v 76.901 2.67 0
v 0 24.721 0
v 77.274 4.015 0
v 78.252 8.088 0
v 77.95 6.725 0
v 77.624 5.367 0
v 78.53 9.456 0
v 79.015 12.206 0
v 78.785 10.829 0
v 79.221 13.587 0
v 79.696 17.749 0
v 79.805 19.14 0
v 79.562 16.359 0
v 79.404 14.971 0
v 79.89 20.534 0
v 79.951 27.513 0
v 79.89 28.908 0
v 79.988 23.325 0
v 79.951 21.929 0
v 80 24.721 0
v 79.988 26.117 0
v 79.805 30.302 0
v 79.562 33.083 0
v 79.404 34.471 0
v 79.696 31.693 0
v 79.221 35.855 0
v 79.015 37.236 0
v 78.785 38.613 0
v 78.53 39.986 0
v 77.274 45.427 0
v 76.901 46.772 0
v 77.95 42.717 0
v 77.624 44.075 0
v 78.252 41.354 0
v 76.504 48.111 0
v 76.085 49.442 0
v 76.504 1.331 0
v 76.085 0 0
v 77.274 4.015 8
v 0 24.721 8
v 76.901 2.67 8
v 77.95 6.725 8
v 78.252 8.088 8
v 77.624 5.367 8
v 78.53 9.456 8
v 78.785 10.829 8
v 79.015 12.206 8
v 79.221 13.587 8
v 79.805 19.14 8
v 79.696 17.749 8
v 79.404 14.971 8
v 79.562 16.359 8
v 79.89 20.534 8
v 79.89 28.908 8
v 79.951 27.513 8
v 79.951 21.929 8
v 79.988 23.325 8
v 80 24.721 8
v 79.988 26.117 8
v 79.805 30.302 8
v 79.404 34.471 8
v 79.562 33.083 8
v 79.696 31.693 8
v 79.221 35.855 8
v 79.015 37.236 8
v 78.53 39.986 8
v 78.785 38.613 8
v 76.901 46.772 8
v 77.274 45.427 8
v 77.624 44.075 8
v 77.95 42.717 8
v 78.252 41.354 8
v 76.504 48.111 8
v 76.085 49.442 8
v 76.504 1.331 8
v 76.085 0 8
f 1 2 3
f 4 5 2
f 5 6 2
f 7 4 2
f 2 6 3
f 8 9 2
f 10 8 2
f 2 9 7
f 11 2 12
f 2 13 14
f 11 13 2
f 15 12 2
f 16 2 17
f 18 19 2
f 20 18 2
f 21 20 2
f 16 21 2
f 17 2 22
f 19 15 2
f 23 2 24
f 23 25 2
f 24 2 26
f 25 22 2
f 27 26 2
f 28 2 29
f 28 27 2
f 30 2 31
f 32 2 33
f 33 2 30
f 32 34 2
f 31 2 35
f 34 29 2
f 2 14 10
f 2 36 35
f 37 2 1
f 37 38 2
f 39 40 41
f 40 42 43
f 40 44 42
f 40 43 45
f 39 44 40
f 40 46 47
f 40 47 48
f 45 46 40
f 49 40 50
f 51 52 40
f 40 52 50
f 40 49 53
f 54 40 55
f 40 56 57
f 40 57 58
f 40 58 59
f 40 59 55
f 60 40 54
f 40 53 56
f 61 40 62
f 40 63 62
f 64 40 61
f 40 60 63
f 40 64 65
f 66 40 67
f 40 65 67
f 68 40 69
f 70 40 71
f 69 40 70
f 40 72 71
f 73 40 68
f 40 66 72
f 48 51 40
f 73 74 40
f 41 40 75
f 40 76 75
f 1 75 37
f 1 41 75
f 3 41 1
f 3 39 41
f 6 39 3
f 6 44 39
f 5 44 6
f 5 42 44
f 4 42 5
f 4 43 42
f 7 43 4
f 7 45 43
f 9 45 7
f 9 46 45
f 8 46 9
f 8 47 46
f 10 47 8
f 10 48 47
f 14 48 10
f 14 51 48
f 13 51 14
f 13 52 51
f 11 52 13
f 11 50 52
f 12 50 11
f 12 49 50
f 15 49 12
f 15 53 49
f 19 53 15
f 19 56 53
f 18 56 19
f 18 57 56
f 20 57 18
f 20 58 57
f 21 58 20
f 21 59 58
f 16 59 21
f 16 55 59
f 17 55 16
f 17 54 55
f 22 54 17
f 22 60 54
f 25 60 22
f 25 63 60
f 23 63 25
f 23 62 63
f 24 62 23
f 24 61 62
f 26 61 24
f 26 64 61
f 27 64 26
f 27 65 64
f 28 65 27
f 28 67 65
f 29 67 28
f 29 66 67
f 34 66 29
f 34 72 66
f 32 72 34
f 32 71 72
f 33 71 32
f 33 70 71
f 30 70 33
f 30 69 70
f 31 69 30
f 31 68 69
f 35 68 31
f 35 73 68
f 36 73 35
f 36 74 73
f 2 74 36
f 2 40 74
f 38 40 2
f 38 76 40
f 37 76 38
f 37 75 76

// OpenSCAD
$fn = 32;

// ----------------------------------------------------------------------
// Arc profile plate: sector, 38 points
// ----------------------------------------------------------------------

// --- parameters (mm) ---
sector_angle = 36;        // sector angle, degrees
sector_r = 80;            // outer radius
arc_step = 1;             // sampling step of the arc, degrees
plate_t = 8;              // plate thickness, Z

bbox_x = 2 * sector_r * sin(sector_angle / 2);  // chord of the sector
bbox_y = sector_r;  // depth of the sector (apex to arc)

profile = [[76.085, 0], [76.504, 1.331], [76.901, 2.67], [77.274, 4.015], [77.624, 5.367], [77.95, 6.725], [78.252, 8.088], [78.53, 9.456], [78.785, 10.829], [79.015, 12.206], [79.221, 13.587], [79.404, 14.971], [79.562, 16.359], [79.696, 17.749], [79.805, 19.14], [79.89, 20.534], [79.951, 21.929], [79.988, 23.325], [80, 24.721], [79.988, 26.117], [79.951, 27.513], [79.89, 28.908], [79.805, 30.302], [79.696, 31.693], [79.562, 33.083], [79.404, 34.471], [79.221, 35.855], [79.015, 37.236], [78.785, 38.613], [78.53, 39.986], [78.252, 41.354], [77.95, 42.717], [77.624, 44.075], [77.274, 45.427], [76.901, 46.772], [76.504, 48.111], [76.085, 49.442], [0, 24.721]];  // primary outline, 38 points, counter clockwise

// --- the one profile operation ---
linear_extrude(height = plate_t) polygon(points = profile);
